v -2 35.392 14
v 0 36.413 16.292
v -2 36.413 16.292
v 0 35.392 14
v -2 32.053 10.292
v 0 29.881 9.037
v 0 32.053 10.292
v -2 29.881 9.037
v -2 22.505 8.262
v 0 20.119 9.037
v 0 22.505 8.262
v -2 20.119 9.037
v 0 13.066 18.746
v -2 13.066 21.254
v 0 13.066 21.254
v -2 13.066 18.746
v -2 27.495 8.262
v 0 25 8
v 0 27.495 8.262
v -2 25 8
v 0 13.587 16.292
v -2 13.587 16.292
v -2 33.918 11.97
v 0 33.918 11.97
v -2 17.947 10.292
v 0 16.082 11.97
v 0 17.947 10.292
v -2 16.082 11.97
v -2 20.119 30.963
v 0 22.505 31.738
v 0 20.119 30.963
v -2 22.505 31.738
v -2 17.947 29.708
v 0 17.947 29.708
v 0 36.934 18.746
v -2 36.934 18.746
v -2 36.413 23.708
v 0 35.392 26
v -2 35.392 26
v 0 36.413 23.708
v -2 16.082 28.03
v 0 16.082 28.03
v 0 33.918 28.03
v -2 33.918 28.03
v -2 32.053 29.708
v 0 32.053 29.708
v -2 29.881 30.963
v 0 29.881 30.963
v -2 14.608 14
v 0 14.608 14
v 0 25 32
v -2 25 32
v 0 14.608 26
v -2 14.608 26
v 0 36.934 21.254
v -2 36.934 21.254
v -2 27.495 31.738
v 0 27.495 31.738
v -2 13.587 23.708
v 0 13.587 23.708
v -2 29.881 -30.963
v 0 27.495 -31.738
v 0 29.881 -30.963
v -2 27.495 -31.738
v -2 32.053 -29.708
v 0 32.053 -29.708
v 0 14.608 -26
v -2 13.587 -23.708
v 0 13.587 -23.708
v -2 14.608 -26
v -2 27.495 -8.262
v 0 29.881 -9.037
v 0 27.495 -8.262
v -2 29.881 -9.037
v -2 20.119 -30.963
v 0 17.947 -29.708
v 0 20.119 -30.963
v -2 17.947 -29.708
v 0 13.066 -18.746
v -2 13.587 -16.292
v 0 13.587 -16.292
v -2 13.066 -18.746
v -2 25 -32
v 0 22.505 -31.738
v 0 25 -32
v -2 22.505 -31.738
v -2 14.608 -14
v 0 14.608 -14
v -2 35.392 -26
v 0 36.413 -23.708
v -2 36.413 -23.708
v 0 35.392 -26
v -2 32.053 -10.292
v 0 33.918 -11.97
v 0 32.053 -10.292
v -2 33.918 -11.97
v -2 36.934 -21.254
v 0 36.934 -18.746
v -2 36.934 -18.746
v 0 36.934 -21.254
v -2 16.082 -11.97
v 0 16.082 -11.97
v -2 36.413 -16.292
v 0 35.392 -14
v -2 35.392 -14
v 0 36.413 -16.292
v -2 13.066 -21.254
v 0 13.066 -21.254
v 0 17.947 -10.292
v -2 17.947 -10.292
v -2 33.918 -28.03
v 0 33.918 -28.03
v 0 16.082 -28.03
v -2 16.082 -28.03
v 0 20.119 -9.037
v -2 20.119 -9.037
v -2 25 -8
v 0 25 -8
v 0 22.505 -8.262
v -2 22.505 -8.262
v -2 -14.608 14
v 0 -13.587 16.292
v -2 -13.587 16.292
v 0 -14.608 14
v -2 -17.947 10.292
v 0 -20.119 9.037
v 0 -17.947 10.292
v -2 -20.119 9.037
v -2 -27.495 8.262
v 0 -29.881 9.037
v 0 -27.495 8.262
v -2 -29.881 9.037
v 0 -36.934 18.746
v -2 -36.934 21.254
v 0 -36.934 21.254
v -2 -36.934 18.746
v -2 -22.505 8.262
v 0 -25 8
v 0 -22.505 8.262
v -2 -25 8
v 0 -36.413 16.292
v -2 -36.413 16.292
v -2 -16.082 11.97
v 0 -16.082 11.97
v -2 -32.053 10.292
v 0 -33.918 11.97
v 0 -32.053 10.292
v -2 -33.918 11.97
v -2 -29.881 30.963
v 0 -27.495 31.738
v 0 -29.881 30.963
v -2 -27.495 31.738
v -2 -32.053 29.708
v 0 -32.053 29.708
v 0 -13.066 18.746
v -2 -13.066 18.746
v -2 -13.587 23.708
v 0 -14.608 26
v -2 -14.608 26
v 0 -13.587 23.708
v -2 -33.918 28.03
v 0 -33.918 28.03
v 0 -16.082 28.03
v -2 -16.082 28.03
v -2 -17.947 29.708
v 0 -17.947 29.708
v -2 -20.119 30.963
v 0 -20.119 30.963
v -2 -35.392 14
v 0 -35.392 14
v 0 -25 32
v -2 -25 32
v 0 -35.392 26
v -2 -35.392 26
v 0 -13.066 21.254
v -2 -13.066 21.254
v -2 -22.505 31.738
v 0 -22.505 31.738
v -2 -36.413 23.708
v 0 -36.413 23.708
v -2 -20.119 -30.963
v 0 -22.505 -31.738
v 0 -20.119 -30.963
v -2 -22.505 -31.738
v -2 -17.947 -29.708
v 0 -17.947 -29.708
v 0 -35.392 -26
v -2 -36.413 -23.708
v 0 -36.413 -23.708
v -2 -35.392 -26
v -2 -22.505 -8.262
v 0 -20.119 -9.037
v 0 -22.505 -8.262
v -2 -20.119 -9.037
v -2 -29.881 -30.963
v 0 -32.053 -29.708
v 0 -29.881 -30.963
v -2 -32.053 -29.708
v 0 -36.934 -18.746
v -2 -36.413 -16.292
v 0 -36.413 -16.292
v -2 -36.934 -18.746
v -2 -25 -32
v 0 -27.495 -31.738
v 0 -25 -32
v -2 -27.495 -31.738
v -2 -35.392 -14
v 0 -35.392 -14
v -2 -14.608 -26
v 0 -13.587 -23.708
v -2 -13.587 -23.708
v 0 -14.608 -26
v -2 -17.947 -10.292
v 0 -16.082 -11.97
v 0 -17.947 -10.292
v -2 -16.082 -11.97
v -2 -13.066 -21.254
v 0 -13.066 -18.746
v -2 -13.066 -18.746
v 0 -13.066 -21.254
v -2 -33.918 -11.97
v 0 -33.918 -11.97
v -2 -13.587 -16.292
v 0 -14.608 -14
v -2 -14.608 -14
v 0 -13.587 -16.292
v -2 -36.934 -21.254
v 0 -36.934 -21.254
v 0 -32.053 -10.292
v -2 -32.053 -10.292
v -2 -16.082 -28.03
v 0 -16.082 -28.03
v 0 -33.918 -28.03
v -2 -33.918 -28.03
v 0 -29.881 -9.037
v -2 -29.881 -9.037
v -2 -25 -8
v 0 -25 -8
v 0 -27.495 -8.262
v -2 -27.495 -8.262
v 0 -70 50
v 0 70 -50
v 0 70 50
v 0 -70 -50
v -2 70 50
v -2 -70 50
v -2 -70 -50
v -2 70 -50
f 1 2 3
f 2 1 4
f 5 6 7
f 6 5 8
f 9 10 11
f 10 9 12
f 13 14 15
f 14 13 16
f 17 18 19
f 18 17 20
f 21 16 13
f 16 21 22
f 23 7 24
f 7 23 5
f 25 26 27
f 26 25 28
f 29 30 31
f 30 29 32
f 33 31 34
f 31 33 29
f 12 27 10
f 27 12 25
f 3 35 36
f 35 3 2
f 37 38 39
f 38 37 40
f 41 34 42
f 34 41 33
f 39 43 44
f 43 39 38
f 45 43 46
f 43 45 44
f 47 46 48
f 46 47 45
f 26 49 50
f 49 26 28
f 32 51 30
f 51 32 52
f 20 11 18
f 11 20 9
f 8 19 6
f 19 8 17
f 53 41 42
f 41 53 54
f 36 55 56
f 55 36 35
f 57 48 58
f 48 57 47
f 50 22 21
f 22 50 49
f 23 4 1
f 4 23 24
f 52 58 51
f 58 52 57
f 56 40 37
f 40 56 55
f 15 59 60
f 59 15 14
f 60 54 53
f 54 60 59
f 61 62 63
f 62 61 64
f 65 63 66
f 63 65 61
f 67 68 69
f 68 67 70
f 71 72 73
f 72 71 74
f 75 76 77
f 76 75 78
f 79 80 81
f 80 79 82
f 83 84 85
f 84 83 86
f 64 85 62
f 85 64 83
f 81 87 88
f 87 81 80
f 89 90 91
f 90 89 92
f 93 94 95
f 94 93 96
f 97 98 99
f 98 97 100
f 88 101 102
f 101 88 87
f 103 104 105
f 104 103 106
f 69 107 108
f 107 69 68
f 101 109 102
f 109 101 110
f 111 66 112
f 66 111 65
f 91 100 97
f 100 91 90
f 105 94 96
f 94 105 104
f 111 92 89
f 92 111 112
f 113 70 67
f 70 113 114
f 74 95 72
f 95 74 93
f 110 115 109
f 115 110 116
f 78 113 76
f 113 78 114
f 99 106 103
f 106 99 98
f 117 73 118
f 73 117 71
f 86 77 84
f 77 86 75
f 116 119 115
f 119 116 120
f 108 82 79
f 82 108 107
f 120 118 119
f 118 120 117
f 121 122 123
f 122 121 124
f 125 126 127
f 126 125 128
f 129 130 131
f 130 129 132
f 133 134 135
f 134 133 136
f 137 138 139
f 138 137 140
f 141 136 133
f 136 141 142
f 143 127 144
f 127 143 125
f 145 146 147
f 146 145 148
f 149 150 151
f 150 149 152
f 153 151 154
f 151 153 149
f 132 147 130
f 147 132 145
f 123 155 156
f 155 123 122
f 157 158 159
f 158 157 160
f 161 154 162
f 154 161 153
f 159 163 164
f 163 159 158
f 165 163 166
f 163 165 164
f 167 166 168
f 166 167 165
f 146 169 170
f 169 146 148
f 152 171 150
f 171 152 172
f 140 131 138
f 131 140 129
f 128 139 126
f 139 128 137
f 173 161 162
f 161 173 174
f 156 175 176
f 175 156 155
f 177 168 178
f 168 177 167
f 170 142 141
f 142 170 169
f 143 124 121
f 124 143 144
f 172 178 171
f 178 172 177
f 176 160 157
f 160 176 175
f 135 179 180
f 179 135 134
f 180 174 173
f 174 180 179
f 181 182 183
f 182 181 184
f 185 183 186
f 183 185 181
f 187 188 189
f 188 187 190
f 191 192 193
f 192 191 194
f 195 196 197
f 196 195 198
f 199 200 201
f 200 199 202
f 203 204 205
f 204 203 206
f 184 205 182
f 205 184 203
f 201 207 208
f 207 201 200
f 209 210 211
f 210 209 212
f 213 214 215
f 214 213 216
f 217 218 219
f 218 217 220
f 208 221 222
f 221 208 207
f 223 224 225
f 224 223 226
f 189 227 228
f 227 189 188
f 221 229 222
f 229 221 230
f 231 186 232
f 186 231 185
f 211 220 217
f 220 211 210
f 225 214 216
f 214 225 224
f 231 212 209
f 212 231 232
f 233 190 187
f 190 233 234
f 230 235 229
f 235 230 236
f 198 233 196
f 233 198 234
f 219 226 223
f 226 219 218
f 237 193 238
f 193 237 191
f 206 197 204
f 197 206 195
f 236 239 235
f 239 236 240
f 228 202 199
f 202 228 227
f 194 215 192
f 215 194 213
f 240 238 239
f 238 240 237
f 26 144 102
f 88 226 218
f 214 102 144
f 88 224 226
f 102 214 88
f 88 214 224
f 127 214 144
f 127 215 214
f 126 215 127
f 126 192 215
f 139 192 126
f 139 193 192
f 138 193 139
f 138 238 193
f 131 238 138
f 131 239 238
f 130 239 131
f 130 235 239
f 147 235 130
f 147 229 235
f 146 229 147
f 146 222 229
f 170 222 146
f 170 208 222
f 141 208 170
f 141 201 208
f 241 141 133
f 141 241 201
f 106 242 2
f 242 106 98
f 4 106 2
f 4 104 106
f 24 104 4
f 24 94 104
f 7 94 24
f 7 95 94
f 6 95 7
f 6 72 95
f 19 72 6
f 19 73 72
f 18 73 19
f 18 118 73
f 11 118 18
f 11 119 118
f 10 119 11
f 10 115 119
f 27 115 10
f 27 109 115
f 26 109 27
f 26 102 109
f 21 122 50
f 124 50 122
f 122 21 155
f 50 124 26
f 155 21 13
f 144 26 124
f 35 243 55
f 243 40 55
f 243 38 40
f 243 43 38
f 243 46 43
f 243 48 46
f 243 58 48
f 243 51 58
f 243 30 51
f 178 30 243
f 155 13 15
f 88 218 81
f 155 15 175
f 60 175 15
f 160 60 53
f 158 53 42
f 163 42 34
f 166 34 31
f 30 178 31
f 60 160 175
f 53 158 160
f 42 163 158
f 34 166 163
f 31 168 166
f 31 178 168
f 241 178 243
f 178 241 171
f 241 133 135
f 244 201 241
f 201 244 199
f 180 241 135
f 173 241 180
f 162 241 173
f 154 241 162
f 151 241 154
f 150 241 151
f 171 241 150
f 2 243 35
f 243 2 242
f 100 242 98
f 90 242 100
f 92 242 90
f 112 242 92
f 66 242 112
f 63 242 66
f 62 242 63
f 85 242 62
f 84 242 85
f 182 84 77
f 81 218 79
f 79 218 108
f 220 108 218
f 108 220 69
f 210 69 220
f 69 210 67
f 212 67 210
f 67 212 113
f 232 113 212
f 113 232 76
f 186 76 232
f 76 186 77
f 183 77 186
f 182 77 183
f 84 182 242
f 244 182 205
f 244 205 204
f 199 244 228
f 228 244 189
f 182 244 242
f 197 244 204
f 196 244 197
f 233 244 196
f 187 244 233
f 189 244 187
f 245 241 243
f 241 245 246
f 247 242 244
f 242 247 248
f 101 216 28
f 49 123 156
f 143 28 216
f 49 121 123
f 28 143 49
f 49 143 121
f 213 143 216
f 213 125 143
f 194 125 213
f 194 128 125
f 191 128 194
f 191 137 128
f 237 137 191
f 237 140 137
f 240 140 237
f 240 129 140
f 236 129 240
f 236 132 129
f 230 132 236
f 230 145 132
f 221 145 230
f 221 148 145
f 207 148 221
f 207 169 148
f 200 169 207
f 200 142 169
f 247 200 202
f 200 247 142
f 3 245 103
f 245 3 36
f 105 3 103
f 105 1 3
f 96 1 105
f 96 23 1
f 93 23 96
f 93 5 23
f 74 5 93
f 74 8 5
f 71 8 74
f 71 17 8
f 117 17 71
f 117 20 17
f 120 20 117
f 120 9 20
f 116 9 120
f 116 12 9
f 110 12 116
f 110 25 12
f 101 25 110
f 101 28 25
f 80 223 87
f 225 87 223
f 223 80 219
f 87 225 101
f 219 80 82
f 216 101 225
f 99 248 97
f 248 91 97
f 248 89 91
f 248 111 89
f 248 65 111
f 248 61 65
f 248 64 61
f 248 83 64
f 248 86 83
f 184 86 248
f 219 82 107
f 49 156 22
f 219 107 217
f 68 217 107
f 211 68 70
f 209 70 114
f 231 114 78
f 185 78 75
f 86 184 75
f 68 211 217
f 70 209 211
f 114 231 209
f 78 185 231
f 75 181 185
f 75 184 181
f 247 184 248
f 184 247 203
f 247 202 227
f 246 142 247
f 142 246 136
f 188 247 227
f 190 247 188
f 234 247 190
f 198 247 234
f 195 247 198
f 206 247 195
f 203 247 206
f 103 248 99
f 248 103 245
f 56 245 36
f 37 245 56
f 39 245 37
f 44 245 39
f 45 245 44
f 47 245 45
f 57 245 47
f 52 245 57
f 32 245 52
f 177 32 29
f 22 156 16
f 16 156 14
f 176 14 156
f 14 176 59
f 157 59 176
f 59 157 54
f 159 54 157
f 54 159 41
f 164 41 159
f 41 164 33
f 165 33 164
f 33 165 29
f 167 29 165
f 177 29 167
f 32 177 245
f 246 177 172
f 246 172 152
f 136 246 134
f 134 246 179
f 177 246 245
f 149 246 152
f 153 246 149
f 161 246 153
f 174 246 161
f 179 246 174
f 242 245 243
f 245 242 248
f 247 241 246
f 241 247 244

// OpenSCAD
difference(){
    translate([-2,-70,-50])
    cube([2,140,100]);

    union(){
        translate([-10,25,20])
            rotate([0,90,0])
            cylinder(h=20,r=12);
        translate([-10,25,-20])
            rotate([0,90,0])
            cylinder(h=20,r=12);   
        translate([-10,-25,20])
            rotate([0,90,0])
            cylinder(h=20,r=12);
        translate([-10,-25,-20])
            rotate([0,90,0])
            cylinder(h=20,r=12);
    }
}
